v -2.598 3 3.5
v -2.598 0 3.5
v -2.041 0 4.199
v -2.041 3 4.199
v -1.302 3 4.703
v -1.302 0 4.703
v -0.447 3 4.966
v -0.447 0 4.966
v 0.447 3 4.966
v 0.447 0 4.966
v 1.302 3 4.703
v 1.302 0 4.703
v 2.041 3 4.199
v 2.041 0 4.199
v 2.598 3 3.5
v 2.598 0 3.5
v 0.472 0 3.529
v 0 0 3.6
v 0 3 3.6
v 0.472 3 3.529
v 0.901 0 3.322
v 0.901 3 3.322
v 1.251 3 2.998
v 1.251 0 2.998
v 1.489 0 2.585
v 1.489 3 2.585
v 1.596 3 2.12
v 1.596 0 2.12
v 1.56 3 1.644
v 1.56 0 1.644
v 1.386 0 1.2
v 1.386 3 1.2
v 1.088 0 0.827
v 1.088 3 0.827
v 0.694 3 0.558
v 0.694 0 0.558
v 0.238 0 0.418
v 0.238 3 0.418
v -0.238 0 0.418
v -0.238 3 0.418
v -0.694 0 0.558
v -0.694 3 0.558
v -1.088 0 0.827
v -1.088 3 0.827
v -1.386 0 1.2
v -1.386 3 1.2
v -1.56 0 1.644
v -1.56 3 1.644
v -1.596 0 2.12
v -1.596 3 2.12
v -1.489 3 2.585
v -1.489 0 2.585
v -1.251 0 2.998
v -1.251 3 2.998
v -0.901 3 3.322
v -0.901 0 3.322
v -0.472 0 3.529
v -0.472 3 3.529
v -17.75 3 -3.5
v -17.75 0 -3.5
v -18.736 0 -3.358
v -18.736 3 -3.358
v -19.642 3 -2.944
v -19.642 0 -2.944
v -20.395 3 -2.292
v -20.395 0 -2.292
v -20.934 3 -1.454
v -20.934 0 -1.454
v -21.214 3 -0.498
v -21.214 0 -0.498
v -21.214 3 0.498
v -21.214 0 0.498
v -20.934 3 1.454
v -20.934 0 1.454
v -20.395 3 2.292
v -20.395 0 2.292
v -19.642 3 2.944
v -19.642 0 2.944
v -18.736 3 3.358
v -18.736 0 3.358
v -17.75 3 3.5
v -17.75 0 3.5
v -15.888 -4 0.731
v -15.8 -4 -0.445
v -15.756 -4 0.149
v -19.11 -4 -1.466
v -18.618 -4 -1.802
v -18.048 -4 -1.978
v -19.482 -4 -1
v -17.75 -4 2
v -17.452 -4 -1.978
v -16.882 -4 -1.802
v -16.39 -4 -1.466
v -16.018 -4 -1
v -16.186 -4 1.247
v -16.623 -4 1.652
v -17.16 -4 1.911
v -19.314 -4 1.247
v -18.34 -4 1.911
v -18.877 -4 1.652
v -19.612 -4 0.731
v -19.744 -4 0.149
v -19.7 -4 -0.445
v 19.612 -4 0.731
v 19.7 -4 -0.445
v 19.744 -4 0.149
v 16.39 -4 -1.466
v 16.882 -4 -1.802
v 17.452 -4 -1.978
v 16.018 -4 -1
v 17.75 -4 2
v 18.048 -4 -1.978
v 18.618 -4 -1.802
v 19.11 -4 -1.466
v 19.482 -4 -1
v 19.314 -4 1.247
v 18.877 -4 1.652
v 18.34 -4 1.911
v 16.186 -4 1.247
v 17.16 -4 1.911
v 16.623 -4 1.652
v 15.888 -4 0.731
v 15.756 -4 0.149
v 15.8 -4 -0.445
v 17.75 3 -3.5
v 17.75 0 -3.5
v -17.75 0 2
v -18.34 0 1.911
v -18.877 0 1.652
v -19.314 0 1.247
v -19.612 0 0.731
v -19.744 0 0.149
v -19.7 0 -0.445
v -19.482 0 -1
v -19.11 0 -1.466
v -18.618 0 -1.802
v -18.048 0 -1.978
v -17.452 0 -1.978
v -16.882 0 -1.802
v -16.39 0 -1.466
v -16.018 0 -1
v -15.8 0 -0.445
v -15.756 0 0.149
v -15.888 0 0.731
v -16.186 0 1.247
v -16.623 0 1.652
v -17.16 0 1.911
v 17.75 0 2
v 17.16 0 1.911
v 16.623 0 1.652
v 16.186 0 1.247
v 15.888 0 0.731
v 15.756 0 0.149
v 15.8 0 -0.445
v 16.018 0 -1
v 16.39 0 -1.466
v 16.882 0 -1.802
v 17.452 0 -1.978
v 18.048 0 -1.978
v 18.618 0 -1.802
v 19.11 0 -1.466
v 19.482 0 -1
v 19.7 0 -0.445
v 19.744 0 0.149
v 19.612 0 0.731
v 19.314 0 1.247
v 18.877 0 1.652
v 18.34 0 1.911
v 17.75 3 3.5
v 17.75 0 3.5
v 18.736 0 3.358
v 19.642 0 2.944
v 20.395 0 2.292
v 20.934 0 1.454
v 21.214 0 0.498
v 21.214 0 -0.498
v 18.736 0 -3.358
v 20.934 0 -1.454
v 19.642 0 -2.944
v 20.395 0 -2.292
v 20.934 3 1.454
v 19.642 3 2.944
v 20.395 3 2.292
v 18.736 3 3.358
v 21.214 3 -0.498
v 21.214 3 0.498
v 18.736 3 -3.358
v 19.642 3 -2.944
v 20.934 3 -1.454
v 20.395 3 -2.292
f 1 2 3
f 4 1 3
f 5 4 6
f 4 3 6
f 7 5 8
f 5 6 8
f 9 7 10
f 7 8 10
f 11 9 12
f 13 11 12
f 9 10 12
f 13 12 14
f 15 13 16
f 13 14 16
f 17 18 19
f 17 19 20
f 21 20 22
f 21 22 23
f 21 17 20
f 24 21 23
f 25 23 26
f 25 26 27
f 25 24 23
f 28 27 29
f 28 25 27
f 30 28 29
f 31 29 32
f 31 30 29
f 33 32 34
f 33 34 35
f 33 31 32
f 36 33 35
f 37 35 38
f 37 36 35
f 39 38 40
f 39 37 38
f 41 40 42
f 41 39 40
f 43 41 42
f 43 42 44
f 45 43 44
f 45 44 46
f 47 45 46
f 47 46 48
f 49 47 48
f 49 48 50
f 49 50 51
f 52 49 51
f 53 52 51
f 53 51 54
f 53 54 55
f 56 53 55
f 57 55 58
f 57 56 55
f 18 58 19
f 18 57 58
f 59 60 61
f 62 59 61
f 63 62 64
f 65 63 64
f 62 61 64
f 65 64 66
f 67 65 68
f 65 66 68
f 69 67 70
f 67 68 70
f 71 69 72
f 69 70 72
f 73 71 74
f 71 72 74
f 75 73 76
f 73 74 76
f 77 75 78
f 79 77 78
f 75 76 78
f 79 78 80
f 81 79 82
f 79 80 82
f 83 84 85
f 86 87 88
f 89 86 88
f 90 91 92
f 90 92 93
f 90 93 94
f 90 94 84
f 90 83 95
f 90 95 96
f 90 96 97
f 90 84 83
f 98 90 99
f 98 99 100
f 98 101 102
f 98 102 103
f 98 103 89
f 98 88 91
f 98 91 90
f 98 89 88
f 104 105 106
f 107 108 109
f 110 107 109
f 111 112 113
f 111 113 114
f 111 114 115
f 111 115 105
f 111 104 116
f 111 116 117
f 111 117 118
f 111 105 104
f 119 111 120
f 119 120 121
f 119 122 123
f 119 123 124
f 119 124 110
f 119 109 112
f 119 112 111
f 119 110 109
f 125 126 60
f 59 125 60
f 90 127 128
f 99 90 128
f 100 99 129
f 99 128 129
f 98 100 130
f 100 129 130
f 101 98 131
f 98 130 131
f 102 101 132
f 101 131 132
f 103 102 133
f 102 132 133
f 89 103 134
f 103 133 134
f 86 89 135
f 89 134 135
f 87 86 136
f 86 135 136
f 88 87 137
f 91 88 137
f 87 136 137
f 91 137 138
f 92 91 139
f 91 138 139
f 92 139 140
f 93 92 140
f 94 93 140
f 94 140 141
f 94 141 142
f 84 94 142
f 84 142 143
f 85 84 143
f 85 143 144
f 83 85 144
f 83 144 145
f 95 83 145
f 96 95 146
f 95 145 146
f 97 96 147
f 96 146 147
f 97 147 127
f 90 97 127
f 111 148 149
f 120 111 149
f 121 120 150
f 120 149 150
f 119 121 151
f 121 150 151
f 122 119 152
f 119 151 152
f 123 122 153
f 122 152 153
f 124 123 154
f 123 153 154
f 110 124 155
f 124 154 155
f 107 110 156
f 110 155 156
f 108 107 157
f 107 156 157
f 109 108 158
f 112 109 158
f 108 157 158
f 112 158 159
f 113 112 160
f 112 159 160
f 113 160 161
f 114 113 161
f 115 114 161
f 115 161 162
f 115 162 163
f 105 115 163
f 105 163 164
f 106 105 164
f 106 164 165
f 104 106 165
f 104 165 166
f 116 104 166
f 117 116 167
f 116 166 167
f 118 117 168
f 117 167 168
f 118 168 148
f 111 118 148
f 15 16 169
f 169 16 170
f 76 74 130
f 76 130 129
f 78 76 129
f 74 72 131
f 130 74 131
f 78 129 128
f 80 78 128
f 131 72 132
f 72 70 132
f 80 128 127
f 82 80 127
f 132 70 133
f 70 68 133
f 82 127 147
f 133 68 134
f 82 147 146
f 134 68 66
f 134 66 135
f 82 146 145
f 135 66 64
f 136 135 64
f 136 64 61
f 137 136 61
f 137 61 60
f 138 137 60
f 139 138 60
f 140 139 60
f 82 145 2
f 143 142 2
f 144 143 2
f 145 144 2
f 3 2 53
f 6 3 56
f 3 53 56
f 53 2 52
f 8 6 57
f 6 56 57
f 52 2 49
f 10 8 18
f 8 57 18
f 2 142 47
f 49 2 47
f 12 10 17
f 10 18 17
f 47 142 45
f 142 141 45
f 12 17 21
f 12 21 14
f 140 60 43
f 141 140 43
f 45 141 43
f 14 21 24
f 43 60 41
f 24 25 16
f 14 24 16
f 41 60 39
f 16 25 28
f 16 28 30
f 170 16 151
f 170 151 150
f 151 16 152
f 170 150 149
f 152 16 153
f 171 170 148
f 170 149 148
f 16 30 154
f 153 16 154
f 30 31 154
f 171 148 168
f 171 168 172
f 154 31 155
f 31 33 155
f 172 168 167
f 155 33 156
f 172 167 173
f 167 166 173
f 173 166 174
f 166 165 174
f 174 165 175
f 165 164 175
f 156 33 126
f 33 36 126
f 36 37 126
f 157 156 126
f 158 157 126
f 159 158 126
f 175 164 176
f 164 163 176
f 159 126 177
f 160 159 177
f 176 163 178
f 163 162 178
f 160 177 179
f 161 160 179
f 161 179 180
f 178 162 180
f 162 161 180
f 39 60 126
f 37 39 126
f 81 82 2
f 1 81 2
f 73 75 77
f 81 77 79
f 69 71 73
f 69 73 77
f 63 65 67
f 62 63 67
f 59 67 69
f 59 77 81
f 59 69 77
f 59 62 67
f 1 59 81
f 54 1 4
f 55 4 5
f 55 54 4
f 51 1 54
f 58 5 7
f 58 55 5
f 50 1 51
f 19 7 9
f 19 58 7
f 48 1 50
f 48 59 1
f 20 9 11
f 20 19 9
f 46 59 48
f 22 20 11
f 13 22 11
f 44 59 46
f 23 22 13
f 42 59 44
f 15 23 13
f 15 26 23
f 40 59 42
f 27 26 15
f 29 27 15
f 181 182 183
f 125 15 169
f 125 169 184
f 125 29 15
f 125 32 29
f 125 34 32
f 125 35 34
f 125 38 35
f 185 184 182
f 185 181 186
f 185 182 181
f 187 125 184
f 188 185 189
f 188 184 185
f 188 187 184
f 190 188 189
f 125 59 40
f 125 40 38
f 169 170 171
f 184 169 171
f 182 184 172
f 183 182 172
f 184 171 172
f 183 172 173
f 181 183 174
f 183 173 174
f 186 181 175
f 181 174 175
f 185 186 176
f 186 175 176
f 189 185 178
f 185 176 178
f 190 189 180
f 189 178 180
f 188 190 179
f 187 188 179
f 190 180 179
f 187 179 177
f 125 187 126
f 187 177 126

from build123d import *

# Parameters (mm, degrees)
SKETCH1_R           = 1.6
BOSS_EXTRUDE1_DEPTH = 3
SKETCH2_R           = 2
BOSS_EXTRUDE2_DEPTH = 4


with BuildPart() as part:
    # Sketch1 → Boss-Extrude1 (new body)
    with BuildSketch(Plane(origin=(0, 0, 0), x_dir=(1, 0, 0), z_dir=(0, 1, 0))):
        with BuildLine():
            Line((2.598076211, -3.5), (17.75, -3.5))
            ThreePointArc((17.75, -3.5), (21.25, 0), (17.75, 3.5))
            Line((17.75, 3.5), (-17.75, 3.5))
            ThreePointArc((-17.75, 3.5), (-21.25, 0), (-17.75, -3.5))
            Line((-17.75, -3.5), (-2.598076211, -3.5))
            ThreePointArc((-2.598076211, -3.5), (0, -5), (2.598076211, -3.5))
        make_face()
        with Locations(Location((0, -2, 0), (0, 0, 270))):
            Circle(SKETCH1_R, mode=Mode.SUBTRACT)
    extrude(amount=BOSS_EXTRUDE1_DEPTH)

    # Sketch2 → Boss-Extrude2 (add)
    with BuildSketch(Plane.XZ):
        with Locations(Location((-17.75, 0, 0), (0, 0, 90))):
            Circle(SKETCH2_R)
        with Locations(Location((17.75, 0, 0), (0, 0, 90))):
            Circle(SKETCH2_R)
    extrude(amount=BOSS_EXTRUDE2_DEPTH)


solid = part.part
